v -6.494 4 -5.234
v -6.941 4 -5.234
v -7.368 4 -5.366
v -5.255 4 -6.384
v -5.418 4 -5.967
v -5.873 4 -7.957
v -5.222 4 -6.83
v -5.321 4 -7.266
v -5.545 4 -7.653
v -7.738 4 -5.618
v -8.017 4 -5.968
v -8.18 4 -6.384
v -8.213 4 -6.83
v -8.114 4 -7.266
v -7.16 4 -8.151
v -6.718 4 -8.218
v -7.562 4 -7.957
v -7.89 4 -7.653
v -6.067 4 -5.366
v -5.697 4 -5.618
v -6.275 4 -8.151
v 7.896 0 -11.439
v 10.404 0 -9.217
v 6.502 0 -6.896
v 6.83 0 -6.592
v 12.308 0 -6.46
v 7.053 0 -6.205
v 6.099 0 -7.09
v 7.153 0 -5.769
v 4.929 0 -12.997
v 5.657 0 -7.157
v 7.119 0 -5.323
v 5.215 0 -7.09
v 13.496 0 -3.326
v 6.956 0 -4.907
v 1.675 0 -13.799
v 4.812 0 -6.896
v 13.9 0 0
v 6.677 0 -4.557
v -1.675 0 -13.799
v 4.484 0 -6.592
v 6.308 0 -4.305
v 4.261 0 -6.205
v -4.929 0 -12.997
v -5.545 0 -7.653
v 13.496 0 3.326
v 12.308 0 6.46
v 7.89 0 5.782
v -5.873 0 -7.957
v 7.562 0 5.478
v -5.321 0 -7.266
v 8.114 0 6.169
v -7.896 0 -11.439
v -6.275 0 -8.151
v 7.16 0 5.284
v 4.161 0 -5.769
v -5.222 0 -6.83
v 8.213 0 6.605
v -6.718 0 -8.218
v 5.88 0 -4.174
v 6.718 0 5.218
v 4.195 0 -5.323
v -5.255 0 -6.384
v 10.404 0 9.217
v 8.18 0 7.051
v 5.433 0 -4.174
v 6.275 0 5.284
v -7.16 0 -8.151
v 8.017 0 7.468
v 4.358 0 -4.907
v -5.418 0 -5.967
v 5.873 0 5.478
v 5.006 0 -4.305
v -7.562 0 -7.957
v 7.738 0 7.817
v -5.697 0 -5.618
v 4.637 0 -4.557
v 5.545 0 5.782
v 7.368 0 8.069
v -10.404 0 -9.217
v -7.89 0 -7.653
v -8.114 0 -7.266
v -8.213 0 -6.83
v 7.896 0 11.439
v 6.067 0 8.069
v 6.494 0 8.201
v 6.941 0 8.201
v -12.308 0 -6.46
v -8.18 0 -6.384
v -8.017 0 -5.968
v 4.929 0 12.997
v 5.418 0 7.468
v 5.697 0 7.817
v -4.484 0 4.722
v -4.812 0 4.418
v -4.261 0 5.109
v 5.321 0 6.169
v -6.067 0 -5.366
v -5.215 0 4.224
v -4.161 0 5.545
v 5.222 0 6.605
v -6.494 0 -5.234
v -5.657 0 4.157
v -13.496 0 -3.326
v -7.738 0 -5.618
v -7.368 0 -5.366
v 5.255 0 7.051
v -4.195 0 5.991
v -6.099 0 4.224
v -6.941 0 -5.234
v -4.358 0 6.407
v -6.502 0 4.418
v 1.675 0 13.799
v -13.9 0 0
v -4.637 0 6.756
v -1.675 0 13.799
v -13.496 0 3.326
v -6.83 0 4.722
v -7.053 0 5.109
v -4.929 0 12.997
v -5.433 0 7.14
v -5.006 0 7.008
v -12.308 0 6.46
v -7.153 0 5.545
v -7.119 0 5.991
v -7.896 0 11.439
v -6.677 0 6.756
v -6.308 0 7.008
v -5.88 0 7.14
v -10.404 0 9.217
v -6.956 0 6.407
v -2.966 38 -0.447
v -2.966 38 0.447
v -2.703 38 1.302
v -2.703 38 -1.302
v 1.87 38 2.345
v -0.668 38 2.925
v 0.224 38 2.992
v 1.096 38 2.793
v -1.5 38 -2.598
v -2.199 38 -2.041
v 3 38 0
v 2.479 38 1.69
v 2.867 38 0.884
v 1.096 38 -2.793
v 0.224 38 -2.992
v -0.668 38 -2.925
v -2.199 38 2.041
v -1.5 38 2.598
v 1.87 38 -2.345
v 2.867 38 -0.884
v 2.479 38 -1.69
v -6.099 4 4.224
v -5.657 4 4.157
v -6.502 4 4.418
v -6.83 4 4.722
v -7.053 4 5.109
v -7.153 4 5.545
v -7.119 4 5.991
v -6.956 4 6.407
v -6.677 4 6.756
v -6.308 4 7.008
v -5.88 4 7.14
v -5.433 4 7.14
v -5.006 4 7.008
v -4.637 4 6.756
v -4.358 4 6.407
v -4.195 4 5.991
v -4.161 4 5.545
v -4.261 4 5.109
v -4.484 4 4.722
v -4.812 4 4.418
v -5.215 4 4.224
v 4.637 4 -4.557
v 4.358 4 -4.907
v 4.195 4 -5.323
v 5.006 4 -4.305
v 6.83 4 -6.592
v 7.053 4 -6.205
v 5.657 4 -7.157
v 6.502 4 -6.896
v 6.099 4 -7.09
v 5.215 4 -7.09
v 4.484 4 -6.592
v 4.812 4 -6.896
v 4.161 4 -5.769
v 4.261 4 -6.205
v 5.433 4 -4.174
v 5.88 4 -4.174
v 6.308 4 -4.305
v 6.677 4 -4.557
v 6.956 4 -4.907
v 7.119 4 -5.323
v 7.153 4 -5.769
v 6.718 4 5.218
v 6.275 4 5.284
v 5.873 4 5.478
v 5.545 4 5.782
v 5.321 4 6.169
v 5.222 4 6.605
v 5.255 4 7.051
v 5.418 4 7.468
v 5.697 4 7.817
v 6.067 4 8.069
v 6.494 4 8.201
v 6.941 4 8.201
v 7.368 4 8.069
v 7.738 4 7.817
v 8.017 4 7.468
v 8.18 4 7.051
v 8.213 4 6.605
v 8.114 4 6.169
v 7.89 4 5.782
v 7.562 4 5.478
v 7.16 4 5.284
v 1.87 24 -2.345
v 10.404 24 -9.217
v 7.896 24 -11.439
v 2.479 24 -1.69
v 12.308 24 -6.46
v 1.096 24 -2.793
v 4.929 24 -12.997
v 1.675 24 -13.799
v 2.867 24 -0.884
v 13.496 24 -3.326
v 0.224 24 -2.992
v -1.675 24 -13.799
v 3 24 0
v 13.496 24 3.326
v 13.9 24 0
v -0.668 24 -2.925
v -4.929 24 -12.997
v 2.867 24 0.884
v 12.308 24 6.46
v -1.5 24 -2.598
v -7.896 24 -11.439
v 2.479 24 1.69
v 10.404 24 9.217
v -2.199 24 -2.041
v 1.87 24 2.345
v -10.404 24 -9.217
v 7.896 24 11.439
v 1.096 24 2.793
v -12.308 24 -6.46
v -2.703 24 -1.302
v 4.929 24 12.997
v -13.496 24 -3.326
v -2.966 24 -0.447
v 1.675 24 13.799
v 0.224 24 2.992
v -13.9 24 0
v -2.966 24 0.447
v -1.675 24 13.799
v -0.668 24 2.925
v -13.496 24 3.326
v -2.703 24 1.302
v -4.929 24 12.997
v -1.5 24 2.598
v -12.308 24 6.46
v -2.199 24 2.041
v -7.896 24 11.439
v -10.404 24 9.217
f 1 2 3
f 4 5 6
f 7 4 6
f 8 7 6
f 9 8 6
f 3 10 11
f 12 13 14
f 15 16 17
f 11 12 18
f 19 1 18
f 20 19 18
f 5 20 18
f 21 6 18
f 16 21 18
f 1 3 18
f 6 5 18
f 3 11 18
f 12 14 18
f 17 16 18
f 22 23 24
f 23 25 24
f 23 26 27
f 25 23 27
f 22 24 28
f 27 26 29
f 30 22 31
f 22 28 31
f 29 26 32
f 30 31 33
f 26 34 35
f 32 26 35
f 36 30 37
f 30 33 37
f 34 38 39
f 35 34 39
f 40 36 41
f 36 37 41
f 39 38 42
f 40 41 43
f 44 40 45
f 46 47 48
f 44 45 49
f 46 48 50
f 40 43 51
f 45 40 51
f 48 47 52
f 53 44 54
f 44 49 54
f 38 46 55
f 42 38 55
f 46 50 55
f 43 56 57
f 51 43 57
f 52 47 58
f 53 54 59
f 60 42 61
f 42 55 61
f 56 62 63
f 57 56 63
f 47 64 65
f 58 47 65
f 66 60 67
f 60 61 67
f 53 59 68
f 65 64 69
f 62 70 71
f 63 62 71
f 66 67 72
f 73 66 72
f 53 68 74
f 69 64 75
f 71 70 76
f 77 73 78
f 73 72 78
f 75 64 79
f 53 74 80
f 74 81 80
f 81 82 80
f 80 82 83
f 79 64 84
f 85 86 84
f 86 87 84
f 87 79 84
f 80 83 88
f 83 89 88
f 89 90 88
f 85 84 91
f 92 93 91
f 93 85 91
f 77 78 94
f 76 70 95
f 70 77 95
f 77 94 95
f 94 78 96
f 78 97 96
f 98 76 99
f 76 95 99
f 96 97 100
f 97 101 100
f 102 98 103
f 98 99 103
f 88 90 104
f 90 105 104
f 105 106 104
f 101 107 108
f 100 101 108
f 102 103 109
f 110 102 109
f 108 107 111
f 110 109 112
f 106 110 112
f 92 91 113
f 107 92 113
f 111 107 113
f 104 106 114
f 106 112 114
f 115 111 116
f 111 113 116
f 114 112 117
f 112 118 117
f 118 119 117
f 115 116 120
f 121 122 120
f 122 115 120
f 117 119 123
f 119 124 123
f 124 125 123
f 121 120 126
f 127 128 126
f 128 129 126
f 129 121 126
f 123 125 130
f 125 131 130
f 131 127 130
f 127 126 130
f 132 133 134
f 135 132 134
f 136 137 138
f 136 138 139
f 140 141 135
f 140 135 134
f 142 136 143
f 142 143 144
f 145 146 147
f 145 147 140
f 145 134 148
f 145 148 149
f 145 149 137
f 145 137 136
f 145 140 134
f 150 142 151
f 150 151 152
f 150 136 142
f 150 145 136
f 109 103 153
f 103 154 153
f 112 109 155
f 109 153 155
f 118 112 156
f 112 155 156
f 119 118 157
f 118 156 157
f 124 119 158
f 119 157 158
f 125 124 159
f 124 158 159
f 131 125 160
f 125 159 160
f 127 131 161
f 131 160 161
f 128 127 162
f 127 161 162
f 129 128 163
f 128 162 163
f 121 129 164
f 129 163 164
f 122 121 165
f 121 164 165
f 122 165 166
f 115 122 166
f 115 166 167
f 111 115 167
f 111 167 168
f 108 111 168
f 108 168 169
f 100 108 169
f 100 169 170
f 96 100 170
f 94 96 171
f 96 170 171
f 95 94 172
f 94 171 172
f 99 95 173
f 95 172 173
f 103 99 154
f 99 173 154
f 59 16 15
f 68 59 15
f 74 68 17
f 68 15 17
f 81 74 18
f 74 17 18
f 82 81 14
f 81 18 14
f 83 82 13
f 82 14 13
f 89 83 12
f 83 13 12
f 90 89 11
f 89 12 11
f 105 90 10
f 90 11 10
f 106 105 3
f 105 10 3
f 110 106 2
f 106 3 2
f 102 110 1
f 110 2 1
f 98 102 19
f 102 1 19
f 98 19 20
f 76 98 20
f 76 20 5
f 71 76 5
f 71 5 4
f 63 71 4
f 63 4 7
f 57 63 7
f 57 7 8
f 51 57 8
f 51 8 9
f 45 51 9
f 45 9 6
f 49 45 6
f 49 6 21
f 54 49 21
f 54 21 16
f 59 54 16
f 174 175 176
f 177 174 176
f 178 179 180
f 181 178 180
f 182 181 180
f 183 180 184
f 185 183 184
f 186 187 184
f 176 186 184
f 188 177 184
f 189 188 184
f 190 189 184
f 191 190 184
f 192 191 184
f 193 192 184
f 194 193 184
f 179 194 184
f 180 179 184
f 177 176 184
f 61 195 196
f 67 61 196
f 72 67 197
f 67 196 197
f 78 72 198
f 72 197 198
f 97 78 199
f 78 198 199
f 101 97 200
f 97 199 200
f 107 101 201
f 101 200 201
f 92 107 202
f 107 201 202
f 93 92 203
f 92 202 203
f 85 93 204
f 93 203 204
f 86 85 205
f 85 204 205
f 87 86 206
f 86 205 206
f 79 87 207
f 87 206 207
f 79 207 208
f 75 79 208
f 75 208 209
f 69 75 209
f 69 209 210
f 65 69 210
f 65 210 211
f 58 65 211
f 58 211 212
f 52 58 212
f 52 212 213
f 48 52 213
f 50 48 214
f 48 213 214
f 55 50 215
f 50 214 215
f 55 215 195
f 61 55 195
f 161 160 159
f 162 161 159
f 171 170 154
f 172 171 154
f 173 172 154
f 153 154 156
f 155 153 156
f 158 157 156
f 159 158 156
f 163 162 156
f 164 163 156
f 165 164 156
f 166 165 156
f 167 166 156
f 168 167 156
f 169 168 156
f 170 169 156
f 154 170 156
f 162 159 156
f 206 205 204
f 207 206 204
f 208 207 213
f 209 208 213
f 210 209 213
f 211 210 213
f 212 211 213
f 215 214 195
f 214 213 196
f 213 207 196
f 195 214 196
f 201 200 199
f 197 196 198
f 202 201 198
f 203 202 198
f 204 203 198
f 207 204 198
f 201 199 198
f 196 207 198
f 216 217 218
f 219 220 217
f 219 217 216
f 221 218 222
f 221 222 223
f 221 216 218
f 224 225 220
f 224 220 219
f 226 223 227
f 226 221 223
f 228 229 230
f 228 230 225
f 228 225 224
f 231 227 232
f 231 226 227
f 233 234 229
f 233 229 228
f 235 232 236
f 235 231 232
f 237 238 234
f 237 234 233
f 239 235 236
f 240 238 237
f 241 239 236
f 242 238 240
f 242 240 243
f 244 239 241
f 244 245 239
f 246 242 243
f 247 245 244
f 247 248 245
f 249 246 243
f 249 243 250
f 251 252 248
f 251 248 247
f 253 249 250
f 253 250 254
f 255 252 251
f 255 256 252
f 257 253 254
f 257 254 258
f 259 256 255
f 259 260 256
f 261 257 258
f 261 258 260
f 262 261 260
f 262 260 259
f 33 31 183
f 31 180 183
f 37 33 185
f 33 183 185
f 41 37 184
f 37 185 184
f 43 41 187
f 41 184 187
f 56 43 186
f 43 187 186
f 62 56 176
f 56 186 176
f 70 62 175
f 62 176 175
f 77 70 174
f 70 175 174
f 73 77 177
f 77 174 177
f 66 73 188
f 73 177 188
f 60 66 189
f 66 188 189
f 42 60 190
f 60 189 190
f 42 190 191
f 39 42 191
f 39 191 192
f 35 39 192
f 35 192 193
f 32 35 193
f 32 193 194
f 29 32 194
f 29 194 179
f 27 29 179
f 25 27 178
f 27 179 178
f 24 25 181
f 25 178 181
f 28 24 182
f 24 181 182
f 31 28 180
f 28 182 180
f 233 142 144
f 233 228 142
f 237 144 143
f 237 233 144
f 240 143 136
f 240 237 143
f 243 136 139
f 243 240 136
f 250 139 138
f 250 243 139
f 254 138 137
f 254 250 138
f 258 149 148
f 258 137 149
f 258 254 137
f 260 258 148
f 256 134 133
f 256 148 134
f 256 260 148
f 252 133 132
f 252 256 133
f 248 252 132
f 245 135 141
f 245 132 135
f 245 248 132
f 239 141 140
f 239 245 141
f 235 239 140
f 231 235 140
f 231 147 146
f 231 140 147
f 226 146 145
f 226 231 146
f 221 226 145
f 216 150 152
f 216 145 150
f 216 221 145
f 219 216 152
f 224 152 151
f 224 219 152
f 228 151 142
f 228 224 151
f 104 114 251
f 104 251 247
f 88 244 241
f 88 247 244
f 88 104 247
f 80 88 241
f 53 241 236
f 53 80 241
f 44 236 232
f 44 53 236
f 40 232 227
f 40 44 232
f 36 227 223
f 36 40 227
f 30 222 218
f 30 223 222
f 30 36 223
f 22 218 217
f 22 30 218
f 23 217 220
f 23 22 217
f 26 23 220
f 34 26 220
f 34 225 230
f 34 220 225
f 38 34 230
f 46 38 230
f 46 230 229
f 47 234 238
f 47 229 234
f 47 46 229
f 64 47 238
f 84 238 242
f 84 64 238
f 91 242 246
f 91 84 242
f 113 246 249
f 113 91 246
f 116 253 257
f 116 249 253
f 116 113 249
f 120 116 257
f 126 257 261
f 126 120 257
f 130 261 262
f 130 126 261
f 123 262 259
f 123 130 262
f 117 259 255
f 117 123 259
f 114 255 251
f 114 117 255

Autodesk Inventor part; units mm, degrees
ref_plane "YZ Plane" through (0, 0, 0) normal (1, 0, 0) x (0, 1, 0)
ref_plane "XZ Plane" through (0, 0, 0) normal (0, 1, 0) x (-1, 0, 0)
ref_plane "XY Plane" through (0, 0, 0) normal (0, 0, 1) x (1, 0, 0)
sketch "Sketch1" plane through (0, 0, 0) normal (0, 1, 0) x (-1, 0, 0)
  line L0 (93.6212, 93.2037) -> (93.6212, -131.4276) construction
  line L1 (93.6212, -131.4276) -> (12.1295, -131.4276) construction
  line L2 (12.1295, -131.4276) -> (12.1295, 93.2037) construction
  line L3 (12.1295, 93.2037) -> (93.6212, 93.2037) construction
  circle A0 centre (0, 0) radius 13.9
  circle A1 centre (0, 0) radius 8 construction
  circle A2 centre (0, 0) radius 9.5 construction
  line L4 (0, 0) -> (-9.8288, -9.8288) construction
  line L5 (0, 0) -> (13.9, 0) construction
  line L6 (0, 0) -> (9.8288, -9.8288) construction
  line L7 (0, 0) -> (9.8288, 9.8288) construction
  line L8 (0, 0) -> (-9.8288, 9.8288) construction
  point P0 (-6.7175, 6.7175)
  point P1 (-5.6569, -5.6569)
  point P2 (6.7175, -6.7175)
  point P3 (5.6569, 5.6569)
  dimension "d7" = 27.8
  dimension "d8" = 16
  dimension "d9" = 19
  dimension "d10" = 135
extrude "Extrusion1" add sketch "Sketch1" along normal blind 24
hole "Hole1" at (6.7175, 0, 6.7175) at (5.6569, 0, -5.6569) at (-6.7175, 0, -6.7175) at (-5.6569, 0, 5.6569) direction (0, 1, 0) diameter 3 depth 4
sketch "Sketch2" plane through (0, 24, 0) normal (0, 1, 0) x (1, 0, 0)
  circle A0 centre (0, 0) radius 3
  dimension "d25" = 6
extrude "Extrusion2" add sketch "Sketch2" along normal blind 14
properties part number "MOTOR"
